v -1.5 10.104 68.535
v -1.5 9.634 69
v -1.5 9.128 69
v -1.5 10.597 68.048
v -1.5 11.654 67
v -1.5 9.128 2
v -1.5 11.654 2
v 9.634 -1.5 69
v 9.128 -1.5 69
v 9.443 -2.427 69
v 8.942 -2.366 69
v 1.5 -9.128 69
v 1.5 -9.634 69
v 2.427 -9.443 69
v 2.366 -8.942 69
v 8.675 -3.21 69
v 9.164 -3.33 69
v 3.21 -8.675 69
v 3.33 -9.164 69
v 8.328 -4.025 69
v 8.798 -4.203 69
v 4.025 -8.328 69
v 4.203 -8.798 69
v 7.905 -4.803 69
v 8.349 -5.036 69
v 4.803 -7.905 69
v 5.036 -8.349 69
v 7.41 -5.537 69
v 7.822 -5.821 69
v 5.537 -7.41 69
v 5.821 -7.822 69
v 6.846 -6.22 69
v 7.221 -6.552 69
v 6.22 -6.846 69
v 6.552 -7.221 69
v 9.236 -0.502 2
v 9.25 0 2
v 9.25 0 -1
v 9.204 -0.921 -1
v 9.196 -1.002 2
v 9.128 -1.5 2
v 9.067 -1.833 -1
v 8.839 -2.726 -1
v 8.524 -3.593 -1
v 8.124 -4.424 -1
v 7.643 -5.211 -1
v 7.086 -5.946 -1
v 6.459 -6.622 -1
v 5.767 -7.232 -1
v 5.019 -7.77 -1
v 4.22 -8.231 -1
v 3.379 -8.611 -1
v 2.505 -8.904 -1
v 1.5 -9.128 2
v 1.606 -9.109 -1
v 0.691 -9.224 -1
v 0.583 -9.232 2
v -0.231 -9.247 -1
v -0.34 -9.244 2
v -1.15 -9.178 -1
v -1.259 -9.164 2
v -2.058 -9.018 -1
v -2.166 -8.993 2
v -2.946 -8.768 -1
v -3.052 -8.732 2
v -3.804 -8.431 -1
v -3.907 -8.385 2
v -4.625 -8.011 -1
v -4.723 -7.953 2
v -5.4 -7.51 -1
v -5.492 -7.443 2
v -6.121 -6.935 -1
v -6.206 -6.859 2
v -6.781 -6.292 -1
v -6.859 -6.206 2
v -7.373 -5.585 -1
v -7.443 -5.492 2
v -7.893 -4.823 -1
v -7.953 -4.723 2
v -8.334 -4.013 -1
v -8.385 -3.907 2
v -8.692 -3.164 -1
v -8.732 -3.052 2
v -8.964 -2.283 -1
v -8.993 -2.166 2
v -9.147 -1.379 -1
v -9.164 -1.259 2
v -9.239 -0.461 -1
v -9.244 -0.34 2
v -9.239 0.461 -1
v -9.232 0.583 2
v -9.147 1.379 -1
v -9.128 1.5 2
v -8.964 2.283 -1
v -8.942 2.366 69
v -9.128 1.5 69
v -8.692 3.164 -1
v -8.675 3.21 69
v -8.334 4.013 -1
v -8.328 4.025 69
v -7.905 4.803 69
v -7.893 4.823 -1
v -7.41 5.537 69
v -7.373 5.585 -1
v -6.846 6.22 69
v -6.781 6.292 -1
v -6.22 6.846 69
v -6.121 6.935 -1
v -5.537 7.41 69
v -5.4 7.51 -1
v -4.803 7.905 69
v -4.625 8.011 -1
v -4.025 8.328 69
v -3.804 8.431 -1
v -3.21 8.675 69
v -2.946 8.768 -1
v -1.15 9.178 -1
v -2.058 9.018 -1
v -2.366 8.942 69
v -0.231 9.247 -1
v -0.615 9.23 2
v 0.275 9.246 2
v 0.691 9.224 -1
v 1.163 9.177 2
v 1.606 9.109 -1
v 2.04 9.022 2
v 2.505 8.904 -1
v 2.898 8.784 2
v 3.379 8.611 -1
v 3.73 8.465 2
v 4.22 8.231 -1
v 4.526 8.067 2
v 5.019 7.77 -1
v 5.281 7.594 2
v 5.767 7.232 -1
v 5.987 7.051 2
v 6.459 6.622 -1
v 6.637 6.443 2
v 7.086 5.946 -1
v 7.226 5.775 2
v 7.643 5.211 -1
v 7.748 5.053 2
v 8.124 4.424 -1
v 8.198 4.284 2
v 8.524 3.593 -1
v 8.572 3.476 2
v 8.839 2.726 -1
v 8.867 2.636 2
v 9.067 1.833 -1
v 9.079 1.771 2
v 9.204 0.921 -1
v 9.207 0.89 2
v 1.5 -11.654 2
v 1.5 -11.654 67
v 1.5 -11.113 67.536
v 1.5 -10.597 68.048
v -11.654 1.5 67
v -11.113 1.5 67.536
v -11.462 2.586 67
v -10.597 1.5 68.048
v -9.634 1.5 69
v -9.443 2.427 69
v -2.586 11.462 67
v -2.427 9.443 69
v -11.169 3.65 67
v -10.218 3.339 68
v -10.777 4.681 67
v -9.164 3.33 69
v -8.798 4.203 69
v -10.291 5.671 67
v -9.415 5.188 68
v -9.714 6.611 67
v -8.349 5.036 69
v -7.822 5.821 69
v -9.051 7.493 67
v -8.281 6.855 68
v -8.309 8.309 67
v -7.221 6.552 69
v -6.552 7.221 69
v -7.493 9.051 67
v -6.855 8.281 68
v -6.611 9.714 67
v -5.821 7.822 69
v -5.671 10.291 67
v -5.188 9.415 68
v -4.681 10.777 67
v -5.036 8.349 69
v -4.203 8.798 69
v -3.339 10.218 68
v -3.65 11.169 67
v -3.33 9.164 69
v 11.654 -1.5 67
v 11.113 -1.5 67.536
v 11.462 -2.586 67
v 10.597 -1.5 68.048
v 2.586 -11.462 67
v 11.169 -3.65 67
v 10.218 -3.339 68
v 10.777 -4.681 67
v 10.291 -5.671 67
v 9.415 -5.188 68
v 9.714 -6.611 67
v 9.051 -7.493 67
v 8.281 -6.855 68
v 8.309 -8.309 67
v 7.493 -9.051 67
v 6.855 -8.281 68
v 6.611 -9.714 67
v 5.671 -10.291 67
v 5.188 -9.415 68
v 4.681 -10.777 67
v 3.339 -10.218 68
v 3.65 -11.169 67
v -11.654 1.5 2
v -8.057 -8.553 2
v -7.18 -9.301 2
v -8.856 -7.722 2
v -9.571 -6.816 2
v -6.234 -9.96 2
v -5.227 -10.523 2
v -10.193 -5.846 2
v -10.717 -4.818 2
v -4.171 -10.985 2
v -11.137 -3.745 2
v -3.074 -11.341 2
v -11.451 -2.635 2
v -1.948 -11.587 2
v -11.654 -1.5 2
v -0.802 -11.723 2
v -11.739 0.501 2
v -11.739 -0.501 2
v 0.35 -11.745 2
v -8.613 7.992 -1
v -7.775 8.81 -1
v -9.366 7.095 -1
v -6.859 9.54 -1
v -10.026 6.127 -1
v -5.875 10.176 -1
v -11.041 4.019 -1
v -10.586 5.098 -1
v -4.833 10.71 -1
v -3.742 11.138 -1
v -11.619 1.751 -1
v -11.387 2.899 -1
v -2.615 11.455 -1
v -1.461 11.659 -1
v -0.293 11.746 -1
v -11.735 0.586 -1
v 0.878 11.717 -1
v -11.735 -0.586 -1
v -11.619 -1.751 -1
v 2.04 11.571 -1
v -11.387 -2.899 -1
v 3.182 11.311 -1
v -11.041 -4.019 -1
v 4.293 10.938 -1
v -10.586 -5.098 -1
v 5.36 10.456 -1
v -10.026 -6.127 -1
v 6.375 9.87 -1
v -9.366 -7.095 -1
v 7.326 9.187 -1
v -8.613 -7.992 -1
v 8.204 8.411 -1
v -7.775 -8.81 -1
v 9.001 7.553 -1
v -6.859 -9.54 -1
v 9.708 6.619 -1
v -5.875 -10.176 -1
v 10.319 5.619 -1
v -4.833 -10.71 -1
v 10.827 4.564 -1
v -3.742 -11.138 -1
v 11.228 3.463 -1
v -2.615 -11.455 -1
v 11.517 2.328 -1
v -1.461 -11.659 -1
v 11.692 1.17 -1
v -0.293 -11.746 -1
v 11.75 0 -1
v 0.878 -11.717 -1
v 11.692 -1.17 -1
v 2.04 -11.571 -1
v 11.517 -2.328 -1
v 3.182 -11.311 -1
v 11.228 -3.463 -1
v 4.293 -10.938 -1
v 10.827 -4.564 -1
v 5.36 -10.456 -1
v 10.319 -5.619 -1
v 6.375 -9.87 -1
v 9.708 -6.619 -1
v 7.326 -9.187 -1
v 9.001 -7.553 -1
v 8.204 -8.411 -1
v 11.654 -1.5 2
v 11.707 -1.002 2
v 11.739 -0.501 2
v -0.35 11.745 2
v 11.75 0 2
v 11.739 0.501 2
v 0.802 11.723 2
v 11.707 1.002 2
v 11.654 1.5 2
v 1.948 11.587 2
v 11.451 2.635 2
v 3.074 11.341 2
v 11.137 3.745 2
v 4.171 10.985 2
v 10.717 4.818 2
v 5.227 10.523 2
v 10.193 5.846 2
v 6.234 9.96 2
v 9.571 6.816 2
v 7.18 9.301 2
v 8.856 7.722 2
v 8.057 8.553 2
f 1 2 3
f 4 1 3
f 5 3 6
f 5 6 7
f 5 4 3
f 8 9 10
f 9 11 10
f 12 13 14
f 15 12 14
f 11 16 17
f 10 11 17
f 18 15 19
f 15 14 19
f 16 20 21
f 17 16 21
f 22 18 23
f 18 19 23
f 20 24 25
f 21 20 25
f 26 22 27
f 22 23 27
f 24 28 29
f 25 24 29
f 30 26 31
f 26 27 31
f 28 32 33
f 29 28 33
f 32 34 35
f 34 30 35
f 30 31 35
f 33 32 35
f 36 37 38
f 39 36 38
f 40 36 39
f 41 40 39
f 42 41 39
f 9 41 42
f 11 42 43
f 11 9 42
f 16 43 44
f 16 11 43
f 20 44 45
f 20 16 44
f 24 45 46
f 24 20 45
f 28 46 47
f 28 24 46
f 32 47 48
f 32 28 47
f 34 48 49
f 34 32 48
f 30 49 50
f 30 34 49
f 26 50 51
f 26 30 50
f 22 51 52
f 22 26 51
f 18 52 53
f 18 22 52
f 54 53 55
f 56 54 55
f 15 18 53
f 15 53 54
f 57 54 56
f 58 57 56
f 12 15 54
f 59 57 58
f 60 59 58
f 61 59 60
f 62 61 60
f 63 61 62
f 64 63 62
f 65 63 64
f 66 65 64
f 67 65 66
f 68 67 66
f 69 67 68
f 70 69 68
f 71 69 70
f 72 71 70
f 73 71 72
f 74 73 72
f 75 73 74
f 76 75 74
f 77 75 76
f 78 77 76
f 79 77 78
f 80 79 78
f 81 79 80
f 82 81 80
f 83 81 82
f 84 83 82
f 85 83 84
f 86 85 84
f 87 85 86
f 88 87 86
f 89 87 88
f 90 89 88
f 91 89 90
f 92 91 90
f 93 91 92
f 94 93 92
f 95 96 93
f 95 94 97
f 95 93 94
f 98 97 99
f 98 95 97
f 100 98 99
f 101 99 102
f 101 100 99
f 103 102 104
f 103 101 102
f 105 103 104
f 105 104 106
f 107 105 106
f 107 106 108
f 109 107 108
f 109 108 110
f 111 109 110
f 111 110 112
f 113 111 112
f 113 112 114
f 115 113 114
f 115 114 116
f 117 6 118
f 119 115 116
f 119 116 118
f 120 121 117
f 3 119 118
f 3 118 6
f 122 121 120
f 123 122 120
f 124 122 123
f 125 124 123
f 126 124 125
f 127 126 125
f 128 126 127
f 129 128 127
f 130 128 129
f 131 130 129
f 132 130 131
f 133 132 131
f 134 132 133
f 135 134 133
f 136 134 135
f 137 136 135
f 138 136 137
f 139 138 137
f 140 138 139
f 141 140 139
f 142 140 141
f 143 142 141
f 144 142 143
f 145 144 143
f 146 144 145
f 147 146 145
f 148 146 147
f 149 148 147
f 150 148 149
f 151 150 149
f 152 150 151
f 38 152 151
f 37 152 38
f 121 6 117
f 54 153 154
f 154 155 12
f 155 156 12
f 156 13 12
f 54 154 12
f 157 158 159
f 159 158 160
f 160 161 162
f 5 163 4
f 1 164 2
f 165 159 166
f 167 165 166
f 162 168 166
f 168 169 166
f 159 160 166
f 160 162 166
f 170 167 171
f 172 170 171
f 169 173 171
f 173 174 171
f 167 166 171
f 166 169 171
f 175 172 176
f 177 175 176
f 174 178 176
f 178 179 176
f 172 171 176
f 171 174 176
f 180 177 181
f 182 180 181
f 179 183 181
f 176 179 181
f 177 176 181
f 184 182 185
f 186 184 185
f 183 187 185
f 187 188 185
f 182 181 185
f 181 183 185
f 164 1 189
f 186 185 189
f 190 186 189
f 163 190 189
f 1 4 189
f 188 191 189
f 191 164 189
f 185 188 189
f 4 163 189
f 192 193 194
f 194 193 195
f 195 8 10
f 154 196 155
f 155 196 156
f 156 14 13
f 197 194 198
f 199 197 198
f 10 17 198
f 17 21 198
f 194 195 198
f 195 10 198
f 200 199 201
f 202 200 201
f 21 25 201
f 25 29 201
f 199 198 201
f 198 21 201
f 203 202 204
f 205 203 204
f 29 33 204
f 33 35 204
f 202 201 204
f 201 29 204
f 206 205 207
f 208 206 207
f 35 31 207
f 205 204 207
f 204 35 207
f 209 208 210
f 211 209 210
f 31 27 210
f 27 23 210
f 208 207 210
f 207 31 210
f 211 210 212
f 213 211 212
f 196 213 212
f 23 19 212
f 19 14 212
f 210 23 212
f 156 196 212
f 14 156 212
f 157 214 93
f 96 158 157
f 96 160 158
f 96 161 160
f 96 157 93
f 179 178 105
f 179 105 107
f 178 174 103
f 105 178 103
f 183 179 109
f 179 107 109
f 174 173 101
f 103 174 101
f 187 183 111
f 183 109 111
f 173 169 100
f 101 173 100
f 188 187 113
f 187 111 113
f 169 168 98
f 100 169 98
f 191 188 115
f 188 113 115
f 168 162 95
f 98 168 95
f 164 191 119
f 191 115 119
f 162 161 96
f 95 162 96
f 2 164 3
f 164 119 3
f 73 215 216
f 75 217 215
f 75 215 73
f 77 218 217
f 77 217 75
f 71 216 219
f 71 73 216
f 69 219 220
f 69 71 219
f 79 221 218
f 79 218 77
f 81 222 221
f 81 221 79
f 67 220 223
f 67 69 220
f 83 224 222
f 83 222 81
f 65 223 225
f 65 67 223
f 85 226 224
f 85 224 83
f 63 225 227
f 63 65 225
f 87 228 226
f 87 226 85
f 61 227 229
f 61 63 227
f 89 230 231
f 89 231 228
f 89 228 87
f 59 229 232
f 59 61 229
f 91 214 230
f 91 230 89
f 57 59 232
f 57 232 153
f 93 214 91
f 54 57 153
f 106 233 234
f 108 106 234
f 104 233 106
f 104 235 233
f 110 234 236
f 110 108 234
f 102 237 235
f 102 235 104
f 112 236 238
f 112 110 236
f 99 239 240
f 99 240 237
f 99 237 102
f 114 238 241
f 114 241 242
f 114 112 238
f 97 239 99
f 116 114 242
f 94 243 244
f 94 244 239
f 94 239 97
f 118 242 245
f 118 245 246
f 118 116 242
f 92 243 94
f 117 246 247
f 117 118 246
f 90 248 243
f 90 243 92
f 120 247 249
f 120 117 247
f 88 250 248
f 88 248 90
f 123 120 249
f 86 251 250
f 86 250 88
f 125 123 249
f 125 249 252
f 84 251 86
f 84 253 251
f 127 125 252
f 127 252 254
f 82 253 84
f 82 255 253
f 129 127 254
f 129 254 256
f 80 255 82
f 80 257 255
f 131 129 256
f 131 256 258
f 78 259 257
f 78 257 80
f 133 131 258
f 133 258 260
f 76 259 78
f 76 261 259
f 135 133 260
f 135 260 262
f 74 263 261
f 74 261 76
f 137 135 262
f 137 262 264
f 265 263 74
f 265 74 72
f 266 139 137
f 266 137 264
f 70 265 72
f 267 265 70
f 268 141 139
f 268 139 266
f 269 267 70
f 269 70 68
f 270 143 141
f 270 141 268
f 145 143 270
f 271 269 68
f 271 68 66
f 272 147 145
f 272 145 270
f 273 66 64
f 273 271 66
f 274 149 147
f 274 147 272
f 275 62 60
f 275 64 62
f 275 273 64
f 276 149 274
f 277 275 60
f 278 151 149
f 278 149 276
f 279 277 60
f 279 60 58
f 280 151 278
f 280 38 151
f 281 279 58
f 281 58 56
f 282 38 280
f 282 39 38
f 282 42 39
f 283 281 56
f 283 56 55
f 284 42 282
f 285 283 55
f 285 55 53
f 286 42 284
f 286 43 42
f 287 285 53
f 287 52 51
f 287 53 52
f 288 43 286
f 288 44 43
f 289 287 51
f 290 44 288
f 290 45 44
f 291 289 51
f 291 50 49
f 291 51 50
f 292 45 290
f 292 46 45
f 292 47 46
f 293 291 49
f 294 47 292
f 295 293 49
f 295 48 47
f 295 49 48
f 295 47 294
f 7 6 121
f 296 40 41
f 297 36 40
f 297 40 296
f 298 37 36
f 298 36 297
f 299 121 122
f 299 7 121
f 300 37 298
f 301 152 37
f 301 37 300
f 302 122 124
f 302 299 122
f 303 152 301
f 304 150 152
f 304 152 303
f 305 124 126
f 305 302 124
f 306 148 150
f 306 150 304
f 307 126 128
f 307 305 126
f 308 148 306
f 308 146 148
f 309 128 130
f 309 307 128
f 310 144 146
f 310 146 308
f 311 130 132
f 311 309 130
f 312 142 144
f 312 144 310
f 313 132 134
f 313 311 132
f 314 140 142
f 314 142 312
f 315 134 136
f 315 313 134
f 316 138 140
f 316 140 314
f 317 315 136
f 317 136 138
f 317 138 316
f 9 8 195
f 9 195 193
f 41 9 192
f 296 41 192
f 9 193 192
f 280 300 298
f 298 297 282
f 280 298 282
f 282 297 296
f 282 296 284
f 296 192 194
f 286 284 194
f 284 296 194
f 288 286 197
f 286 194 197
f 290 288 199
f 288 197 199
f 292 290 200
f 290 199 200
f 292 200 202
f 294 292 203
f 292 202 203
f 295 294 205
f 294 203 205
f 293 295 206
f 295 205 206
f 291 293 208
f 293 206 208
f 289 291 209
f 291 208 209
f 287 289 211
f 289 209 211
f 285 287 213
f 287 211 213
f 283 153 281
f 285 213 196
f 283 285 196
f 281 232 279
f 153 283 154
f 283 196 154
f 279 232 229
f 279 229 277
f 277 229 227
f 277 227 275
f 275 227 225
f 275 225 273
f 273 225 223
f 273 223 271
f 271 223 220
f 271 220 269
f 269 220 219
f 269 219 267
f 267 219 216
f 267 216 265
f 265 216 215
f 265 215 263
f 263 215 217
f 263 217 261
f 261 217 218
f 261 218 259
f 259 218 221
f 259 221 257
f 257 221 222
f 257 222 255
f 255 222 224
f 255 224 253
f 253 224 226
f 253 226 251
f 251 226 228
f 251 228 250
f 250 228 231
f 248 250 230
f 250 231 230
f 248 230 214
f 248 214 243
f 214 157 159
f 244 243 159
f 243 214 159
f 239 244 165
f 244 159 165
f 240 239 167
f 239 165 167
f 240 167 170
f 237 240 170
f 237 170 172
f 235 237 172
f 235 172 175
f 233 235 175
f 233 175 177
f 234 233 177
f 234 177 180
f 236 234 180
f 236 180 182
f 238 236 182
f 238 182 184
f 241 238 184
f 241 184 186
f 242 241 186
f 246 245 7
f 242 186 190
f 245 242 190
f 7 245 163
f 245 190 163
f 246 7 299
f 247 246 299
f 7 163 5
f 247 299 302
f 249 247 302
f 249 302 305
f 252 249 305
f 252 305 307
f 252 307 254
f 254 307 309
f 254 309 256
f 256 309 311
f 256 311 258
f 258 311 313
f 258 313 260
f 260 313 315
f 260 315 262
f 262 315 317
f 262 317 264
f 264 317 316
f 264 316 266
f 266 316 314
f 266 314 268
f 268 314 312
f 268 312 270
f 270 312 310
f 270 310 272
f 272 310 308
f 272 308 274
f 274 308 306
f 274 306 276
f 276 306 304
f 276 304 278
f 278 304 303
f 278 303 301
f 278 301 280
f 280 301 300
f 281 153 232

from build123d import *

# Parameters (mm, degrees)
SKETCH023_R             = 11.75
SKETCH023_R_2           = 9.25
PAD015_DEPTH            = 70
SKETCH025_W             = 31.48
SKETCH025_H             = 3
POCKET007_DEPTH         = 67
CHAMFER006_SIZE         = 2
SKETCH024_W             = 13.153862
SKETCH024_H             = 12.44
POCKET006_DEPTH         = 67
BODY013_PLACEMENT_ANGLE = 180


with BuildPart() as part:
    # Sketch023 → Pad015 (new body)
    with BuildSketch(Plane.XY):
        Circle(SKETCH023_R)
        Circle(SKETCH023_R_2, mode=Mode.SUBTRACT)
    extrude(amount=PAD015_DEPTH)

    # Sketch025 (on Face3 of Pad015) → Pocket007 (cut)
    with BuildSketch(Plane(origin=(0, 0, 0), x_dir=(1, 0, 0), z_dir=(0, 0, -1))):
        Rectangle(SKETCH025_W, SKETCH025_H)
    extrude(amount=-POCKET007_DEPTH, mode=Mode.SUBTRACT)

    # Chamfer006
    chamfer006_edges = [part.edges().sort_by_distance(p)[0] for p in [
        (0, 11.75, 0),
        (0, -11.75, 0),
    ]]
    chamfer(chamfer006_edges, length=CHAMFER006_SIZE)

    # Sketch024 (on Face11 of Chamfer006) → Pocket006 (cut)
    with BuildSketch(Plane(origin=(0, 0, 0), x_dir=(1, 0, 0), z_dir=(0, 0, -1))):
        with Locations((5.076931, 7.72)):
            Rectangle(SKETCH024_W, SKETCH024_H)
        with Locations((-5.076931, -7.72)):
            Rectangle(SKETCH024_W, SKETCH024_H)
    extrude(amount=-POCKET006_DEPTH, mode=Mode.SUBTRACT)


with BuildPart() as part_1:
    # Body013 placement: moved
    add(part.part.moved(Location((0, 0, 69))).rotate(Axis((0, 0, 69), (1, 0, 0)), BODY013_PLACEMENT_ANGLE))


solid = part_1.part
